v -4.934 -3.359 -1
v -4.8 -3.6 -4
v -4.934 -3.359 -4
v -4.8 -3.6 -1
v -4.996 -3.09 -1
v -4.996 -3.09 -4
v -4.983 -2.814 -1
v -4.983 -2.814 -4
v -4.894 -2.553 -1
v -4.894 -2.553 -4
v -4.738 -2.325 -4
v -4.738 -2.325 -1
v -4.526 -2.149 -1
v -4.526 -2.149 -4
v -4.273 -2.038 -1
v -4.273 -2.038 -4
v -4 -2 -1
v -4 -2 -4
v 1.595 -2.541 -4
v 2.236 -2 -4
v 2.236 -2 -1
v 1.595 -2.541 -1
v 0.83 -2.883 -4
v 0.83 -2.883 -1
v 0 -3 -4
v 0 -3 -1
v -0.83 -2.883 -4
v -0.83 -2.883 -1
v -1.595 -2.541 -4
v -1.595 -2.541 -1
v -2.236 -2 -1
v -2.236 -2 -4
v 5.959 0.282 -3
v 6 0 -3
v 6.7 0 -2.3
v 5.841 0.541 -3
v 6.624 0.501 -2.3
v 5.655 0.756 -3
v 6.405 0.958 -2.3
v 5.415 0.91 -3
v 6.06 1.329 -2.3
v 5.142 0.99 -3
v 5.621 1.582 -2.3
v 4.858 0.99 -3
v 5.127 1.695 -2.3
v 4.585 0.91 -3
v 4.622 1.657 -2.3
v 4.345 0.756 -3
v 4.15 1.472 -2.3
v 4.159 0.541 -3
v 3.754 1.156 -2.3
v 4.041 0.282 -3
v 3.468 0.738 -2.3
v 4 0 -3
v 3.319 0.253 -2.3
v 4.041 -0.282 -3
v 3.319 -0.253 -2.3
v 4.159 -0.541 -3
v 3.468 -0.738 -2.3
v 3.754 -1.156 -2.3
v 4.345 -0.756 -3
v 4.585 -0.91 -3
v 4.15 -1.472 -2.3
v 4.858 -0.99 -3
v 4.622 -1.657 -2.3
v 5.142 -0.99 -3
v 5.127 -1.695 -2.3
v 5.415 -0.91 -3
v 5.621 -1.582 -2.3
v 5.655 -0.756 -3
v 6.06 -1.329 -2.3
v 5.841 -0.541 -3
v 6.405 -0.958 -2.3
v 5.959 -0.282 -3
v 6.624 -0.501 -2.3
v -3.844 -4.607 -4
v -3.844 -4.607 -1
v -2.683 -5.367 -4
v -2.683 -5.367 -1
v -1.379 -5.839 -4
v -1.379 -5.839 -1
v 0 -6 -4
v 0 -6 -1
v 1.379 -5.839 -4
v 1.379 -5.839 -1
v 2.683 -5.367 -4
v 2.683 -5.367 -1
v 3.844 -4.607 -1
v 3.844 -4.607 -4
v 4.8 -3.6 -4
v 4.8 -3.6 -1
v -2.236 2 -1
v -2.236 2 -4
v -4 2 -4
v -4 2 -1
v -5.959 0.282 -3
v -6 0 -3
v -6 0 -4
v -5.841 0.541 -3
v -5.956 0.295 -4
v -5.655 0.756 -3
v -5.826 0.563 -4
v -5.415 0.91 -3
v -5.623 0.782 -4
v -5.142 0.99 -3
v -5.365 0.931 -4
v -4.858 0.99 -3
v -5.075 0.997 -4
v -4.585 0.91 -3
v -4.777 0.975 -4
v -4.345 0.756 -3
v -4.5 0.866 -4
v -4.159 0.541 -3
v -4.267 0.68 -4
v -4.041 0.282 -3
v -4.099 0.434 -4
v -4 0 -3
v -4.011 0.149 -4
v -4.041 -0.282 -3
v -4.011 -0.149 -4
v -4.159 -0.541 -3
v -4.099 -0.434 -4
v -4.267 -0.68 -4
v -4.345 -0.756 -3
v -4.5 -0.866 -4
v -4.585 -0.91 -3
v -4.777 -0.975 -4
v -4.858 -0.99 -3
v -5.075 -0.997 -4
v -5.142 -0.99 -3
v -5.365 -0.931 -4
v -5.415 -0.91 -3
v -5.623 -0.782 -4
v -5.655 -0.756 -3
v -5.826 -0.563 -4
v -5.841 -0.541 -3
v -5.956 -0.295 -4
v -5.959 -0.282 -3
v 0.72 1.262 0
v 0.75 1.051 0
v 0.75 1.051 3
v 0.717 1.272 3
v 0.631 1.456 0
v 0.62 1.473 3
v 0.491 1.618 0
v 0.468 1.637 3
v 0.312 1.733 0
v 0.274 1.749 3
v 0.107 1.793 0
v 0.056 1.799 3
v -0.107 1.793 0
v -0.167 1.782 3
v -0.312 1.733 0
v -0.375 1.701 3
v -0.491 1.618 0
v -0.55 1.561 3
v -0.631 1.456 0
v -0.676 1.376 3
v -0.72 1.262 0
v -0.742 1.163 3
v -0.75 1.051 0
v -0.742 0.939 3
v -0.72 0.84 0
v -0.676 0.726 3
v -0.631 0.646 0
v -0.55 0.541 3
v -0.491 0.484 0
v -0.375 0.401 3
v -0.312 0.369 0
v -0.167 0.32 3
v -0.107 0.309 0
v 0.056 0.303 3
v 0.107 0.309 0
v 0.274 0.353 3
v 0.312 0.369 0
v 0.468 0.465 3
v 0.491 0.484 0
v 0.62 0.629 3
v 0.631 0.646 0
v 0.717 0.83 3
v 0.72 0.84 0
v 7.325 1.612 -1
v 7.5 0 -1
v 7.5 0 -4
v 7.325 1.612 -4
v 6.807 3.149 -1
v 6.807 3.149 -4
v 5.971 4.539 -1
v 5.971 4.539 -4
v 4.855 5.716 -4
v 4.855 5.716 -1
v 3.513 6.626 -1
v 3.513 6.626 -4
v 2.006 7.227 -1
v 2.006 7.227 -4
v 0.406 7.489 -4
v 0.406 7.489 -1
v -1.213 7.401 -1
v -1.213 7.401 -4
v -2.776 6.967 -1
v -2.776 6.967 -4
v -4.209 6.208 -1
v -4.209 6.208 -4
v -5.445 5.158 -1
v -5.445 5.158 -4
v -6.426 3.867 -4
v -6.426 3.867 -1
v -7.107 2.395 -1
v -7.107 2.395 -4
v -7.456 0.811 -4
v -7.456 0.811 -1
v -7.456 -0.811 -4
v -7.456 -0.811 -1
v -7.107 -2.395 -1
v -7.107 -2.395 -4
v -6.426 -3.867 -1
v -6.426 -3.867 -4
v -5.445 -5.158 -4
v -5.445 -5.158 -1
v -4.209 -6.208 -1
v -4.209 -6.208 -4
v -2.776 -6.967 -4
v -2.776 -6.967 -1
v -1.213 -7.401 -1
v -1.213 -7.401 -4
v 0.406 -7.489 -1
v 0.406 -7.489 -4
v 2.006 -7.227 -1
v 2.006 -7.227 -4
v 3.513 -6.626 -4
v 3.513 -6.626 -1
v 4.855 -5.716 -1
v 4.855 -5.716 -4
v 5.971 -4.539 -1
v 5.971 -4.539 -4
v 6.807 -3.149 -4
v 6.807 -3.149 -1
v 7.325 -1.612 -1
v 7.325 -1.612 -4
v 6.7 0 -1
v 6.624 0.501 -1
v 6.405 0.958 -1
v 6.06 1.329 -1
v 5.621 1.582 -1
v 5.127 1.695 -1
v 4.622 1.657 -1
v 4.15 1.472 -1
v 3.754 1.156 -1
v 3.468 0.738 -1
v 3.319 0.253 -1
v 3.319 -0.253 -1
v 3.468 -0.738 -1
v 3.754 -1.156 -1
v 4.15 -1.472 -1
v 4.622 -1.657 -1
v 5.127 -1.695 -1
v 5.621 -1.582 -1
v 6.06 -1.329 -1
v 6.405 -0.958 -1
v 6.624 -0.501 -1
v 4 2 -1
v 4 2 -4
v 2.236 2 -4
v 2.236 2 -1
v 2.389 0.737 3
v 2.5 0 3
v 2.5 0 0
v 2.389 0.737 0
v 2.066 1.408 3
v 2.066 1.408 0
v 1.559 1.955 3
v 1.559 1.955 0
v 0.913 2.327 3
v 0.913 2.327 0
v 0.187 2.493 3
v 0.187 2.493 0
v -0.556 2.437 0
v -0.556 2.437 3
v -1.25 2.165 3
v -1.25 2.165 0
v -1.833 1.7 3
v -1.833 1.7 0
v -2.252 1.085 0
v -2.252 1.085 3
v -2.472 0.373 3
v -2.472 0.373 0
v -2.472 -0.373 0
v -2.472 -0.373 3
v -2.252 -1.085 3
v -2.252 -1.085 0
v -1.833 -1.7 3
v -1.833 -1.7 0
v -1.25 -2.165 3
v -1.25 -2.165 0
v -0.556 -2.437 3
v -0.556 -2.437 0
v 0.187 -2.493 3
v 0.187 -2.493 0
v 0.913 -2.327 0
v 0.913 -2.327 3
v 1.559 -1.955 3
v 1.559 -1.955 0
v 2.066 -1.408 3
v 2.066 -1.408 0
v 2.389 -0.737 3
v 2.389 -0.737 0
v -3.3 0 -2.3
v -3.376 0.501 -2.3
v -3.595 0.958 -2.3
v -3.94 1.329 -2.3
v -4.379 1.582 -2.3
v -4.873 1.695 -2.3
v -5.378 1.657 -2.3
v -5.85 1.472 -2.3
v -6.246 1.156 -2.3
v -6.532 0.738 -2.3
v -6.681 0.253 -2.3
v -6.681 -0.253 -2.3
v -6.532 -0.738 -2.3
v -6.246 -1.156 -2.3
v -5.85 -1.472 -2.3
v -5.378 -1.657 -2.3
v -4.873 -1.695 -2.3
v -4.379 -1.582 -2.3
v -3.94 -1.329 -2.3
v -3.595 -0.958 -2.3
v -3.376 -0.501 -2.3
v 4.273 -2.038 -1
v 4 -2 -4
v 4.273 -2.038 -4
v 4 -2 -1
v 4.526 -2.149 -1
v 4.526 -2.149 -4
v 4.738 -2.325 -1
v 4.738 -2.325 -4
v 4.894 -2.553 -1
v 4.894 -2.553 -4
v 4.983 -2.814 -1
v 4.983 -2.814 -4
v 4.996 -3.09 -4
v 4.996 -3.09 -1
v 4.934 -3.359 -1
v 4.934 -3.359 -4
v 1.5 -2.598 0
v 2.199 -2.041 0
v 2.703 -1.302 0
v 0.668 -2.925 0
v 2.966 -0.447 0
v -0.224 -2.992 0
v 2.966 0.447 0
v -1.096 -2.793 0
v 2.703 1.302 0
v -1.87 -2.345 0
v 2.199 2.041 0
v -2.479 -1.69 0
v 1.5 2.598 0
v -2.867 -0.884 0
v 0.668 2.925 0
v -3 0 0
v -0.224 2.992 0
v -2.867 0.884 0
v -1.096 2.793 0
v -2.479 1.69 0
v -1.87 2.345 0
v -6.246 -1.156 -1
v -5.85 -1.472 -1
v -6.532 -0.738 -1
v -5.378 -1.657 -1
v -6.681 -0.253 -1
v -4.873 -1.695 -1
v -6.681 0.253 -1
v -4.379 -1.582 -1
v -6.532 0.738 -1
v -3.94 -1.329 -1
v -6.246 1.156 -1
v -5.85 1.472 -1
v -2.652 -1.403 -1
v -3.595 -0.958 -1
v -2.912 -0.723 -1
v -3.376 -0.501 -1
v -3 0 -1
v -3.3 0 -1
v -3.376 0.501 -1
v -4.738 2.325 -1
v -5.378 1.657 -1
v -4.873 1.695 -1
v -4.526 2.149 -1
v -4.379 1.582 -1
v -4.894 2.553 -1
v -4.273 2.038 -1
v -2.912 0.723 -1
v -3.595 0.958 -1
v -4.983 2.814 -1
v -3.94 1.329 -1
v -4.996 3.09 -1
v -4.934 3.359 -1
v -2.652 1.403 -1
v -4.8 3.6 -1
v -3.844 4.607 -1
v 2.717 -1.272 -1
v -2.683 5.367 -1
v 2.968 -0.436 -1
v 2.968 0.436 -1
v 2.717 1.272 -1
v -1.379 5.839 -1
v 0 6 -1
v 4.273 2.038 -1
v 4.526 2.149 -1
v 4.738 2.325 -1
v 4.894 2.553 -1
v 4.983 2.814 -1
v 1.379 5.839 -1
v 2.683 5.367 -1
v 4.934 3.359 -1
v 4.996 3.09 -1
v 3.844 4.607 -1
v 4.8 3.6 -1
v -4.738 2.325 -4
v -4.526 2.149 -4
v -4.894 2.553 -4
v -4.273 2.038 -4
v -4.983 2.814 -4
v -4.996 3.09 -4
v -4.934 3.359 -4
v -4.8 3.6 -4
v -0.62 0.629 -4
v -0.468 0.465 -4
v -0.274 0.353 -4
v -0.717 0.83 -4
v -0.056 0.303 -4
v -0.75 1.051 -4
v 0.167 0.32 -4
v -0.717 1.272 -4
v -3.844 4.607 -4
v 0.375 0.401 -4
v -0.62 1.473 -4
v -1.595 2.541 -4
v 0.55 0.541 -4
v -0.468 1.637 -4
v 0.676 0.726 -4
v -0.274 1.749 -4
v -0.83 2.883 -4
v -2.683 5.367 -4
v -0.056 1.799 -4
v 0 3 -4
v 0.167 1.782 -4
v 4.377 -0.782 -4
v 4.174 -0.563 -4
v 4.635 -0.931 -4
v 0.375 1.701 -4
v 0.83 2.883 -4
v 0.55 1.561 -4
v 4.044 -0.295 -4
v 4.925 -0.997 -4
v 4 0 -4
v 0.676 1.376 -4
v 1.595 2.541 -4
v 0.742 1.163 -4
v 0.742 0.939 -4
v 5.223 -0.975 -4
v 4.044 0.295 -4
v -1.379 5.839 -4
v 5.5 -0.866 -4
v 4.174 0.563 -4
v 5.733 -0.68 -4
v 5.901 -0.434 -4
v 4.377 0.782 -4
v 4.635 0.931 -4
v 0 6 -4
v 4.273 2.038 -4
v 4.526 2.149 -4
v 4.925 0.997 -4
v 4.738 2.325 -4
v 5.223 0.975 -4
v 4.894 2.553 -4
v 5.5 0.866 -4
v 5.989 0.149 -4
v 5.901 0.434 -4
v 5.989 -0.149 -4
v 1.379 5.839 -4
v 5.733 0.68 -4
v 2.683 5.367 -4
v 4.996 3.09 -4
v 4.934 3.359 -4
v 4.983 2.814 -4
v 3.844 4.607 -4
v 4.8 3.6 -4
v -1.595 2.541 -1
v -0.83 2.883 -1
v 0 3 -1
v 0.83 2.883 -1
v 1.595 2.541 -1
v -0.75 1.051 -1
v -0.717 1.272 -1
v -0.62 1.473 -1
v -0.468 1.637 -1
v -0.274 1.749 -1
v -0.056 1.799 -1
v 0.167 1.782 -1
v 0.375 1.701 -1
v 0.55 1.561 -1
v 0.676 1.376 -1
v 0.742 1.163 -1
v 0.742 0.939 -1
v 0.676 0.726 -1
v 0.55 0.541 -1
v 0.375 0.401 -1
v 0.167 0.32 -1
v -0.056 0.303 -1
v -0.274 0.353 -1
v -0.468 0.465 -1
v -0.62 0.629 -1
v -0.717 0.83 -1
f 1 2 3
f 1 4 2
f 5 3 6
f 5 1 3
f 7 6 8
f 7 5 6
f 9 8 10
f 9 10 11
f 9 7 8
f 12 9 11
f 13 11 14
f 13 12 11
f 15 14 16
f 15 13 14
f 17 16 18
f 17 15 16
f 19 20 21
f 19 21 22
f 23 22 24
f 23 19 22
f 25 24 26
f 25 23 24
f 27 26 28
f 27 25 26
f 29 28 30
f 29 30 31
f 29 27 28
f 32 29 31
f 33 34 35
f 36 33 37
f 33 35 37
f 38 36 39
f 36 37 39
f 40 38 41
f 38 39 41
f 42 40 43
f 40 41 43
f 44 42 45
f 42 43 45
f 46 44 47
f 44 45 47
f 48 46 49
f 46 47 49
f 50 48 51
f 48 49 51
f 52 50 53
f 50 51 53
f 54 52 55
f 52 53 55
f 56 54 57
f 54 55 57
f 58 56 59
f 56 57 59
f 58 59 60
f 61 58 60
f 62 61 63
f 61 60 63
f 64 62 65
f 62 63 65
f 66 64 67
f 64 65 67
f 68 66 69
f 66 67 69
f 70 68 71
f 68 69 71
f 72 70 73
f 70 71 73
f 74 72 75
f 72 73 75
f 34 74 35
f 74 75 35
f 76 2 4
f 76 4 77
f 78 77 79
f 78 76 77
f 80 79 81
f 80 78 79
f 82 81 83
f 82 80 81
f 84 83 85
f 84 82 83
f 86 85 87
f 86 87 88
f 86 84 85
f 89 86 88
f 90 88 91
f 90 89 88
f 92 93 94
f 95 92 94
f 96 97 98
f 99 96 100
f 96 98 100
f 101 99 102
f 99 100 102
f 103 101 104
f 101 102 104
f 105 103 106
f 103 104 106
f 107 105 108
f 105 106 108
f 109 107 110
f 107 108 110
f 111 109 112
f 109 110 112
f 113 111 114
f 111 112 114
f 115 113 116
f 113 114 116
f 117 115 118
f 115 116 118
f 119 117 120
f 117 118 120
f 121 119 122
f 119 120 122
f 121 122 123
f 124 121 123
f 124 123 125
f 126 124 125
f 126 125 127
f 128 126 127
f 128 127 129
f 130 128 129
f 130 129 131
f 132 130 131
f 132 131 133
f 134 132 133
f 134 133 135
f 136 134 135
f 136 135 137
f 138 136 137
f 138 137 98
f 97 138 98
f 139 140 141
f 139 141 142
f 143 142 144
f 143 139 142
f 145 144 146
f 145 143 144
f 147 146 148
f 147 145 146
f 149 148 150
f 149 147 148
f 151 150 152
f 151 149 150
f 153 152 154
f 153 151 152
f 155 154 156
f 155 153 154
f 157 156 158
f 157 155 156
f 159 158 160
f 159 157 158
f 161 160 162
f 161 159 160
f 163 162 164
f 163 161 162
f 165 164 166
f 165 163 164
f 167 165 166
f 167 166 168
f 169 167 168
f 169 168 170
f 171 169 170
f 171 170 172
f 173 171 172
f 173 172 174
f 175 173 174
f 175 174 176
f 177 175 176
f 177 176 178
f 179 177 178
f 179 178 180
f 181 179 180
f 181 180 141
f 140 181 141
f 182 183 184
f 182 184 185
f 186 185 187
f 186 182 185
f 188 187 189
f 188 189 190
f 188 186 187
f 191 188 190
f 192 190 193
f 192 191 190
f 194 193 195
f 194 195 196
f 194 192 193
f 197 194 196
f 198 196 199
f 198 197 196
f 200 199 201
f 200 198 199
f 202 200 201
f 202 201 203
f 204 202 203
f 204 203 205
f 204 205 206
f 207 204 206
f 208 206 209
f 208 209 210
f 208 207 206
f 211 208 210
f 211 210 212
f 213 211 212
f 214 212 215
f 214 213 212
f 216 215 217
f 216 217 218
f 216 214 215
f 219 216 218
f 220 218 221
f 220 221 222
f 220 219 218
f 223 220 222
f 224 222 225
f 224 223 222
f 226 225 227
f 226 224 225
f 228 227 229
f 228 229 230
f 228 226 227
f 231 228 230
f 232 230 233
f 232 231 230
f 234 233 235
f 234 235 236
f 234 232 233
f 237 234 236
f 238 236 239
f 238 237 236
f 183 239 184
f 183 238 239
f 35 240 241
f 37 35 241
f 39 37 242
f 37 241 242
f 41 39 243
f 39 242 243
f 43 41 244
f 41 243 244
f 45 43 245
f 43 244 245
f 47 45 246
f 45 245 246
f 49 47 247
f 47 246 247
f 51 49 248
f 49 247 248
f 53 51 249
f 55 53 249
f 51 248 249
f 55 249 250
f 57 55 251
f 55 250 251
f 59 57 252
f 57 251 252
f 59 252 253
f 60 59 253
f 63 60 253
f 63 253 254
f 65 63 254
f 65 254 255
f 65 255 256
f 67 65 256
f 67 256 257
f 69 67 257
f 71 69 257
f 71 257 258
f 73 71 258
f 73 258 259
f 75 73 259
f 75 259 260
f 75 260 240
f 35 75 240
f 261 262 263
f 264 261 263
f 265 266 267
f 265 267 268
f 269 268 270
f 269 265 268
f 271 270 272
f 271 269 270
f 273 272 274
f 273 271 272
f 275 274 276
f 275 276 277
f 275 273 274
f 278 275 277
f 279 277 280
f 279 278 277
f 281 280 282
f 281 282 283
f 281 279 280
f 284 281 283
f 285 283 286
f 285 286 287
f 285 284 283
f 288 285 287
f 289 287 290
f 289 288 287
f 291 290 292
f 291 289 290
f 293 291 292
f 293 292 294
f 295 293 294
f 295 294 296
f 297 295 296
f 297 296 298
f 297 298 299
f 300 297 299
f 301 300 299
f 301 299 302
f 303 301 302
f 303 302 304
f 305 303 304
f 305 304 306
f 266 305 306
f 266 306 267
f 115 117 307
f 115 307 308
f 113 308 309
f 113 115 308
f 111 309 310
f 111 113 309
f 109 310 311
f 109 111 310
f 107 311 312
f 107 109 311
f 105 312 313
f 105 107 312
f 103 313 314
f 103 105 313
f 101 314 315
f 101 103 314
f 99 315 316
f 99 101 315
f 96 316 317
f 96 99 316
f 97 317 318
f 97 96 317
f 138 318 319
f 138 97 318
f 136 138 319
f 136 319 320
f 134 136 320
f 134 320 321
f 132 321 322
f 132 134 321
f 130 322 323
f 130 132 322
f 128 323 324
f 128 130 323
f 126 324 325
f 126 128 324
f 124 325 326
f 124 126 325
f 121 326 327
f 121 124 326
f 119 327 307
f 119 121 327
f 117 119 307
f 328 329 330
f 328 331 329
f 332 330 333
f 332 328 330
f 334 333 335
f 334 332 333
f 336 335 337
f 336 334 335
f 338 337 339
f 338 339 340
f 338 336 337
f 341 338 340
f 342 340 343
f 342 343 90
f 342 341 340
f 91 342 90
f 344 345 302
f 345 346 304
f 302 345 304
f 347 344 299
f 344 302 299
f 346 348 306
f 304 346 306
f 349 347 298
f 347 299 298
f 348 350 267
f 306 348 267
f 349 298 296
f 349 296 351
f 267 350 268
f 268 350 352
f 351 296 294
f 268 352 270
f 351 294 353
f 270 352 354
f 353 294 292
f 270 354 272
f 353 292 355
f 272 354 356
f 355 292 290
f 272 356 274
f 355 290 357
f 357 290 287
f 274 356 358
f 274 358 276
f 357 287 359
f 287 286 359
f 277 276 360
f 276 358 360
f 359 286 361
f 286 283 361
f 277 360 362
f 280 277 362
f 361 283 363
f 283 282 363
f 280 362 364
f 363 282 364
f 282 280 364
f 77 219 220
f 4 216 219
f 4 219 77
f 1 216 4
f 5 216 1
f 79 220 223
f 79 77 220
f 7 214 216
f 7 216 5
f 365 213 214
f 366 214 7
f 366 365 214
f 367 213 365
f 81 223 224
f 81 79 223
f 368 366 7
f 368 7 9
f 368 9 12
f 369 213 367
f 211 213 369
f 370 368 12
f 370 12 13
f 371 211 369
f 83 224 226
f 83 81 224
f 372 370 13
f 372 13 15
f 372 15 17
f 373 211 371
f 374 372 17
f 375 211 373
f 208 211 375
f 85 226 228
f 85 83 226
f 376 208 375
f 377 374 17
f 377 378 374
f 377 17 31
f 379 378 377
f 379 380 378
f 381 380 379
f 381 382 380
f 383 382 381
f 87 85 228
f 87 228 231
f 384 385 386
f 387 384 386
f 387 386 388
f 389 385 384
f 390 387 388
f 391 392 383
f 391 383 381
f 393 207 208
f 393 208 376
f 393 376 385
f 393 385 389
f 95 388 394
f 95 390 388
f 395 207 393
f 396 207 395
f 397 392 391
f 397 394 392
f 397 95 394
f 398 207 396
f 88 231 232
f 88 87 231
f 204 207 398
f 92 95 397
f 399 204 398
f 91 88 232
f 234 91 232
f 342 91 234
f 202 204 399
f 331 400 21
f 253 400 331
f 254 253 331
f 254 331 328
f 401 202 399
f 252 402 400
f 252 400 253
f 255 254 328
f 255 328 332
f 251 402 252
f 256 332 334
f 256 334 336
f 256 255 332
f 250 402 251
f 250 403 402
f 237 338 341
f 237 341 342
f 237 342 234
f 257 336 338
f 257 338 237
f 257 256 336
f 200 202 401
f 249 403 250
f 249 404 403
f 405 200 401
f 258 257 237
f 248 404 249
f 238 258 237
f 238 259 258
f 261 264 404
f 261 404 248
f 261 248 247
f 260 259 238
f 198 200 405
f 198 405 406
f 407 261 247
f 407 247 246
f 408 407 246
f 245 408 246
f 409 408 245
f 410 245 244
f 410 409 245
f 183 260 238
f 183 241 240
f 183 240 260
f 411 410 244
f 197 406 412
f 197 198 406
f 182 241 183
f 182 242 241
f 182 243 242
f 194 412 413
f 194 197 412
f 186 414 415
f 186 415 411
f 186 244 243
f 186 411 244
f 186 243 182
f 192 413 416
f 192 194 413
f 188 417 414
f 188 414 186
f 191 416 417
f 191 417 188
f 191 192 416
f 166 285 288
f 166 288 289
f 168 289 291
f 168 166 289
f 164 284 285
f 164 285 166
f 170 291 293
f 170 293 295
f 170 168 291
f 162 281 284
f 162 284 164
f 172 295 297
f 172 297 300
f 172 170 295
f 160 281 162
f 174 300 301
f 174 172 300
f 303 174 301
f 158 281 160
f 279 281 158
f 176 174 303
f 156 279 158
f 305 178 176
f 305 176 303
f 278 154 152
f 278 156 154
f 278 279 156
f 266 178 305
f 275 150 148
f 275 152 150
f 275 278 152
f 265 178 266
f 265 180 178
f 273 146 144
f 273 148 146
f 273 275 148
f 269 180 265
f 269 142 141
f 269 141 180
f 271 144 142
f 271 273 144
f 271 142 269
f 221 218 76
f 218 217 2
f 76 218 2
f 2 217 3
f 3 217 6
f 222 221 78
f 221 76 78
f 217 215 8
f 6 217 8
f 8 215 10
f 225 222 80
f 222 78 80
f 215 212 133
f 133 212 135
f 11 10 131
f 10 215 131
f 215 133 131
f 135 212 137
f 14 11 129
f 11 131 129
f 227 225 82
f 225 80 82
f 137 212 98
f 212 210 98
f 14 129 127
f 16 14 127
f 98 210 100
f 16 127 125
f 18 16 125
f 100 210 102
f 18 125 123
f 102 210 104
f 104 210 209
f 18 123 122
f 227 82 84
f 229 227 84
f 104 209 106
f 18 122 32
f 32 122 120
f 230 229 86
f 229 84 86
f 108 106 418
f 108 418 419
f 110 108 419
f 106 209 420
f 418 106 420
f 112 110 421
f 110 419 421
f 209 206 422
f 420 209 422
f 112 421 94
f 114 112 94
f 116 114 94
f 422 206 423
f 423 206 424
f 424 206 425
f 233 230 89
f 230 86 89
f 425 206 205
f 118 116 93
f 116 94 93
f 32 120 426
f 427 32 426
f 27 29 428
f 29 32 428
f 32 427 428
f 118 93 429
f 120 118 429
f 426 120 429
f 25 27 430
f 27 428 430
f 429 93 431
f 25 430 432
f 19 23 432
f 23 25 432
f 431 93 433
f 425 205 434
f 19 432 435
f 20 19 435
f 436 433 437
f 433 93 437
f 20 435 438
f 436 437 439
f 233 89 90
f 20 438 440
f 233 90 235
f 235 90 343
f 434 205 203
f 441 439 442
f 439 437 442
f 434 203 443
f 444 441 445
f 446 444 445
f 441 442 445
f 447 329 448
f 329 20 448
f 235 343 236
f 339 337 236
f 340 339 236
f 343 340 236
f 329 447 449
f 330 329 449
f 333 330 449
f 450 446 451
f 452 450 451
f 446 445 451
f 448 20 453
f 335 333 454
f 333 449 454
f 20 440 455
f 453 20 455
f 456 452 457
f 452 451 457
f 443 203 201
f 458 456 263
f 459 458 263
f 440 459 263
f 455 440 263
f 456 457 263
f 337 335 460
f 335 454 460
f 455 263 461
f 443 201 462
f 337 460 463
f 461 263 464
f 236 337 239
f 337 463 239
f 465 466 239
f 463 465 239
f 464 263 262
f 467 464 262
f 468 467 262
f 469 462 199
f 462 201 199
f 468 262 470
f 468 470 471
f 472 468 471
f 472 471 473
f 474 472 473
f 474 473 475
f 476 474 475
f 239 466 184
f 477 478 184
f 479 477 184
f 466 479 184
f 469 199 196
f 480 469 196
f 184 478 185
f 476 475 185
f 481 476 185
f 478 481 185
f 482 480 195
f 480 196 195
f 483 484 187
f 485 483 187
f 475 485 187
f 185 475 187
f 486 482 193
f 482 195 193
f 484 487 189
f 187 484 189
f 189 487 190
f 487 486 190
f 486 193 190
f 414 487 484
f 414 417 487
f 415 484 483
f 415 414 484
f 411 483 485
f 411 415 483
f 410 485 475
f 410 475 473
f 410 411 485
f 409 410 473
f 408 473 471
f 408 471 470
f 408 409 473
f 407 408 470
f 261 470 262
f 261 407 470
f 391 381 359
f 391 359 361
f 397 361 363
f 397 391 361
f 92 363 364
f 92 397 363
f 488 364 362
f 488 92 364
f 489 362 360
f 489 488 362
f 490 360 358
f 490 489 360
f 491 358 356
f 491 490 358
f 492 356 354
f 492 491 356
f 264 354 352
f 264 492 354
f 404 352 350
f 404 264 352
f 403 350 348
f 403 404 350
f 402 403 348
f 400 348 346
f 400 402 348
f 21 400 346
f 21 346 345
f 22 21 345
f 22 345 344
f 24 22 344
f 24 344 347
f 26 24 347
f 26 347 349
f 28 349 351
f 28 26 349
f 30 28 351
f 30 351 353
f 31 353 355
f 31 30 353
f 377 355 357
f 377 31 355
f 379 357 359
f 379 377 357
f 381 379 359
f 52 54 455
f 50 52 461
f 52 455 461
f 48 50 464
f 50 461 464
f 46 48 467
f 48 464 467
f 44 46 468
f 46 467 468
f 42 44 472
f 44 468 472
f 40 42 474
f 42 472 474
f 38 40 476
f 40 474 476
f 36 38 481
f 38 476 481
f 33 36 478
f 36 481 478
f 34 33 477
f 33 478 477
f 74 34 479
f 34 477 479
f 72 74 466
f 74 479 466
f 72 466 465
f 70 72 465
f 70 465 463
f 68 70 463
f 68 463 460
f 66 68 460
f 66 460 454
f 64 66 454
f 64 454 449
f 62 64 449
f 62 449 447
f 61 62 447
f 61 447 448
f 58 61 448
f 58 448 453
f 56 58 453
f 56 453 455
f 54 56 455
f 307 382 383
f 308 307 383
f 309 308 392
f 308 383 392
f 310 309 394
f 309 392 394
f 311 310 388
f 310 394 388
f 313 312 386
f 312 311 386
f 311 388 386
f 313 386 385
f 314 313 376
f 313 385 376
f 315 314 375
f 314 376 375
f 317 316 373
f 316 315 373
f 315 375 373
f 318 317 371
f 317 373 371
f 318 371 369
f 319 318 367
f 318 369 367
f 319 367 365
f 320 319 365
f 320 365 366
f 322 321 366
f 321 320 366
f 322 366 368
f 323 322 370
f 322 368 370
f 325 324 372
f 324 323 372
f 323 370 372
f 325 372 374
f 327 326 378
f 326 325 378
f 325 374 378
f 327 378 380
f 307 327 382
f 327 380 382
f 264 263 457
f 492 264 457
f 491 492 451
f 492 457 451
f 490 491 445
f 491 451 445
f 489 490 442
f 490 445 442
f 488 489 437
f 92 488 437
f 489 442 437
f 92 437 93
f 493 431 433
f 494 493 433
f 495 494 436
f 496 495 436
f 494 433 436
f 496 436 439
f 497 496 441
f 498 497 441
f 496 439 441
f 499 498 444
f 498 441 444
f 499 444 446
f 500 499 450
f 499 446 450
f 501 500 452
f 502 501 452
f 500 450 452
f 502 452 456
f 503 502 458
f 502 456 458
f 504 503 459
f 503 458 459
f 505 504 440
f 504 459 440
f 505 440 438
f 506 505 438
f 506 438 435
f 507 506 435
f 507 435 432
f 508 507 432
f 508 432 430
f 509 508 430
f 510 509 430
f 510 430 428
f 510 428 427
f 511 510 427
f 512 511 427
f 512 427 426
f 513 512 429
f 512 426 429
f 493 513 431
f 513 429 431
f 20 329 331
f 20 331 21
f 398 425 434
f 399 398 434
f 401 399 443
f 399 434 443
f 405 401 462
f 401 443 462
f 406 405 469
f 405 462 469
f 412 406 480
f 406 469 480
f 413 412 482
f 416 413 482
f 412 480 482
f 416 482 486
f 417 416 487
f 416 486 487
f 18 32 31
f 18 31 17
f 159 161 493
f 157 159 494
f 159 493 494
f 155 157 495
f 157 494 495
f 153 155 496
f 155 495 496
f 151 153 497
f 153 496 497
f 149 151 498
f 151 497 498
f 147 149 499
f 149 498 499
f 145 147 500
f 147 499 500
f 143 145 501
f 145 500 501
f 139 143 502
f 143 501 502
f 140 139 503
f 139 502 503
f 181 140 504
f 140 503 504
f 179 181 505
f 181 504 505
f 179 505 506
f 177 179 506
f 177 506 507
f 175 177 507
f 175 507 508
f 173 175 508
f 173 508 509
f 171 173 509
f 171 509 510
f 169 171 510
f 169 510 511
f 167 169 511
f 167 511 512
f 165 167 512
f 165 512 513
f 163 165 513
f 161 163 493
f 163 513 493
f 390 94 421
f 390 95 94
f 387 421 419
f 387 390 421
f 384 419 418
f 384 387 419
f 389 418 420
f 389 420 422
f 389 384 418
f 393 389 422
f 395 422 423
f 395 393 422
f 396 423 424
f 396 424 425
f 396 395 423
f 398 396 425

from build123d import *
from build123d.topology import SkipClean

# Parameters (mm, degrees)
SKETCH_1_R          = 5
SKETCH_1_R_2        = 0.75
EXTRUDE_1_DEPTH     = 3
SKETCH_3_R          = 6.372954201
SKETCH_3_R_2        = 2.5
CUT_EXTRUDE_1_DEPTH = 10
EXTRUDE_START       = 1
SKETCH_5_R          = 3
SKETCH_5_R_2        = 0.75
EXTRUDE_3_DEPTH     = 1
EXTRUDE_START_2     = 3
SKETCH_6_R          = 7
SKETCH_6_R_2        = 1
SKETCH_6_R_3        = 0.75
EXTRUDE_4_DEPTH     = 3
FILLET_2_R          = 1
SKETCH_7_R          = 1.5
CUT_EXTRUDE_2_DEPTH = 2
CHAMFER_1_SIZE      = 0.5
SKETCH_8_R          = 1.7
CUT_EXTRUDE_3_DEPTH = 2
CHAMFER_2_SIZE      = 0.7
SKETCH_9_R          = 7.5
SKETCH_9_R_2        = 6.7
EXTRUDE_5_DEPTH     = 3


# Some blends are built 0.0001 mm under size
with BuildPart() as part:
    # 草图1 → 凸台-拉伸1 (new body)
    with BuildSketch(Plane.XY):
        Circle(SKETCH_1_R)
        with Locations((0, 1.051)):
            Circle(SKETCH_1_R_2, mode=Mode.SUBTRACT)
    extrude(amount=EXTRUDE_1_DEPTH)

    # 草图3 → 切除-拉伸1 (cut)
    with BuildSketch(Plane.XY.offset(3)):
        Circle(SKETCH_3_R)
        Circle(SKETCH_3_R_2, mode=Mode.SUBTRACT)
    extrude(amount=-CUT_EXTRUDE_1_DEPTH, mode=Mode.SUBTRACT)

    # 草图5 → 凸台-拉伸3 (add)
    with SkipClean():  # the faces are left unmerged after this step: merging them gives an invalid solid
        with BuildSketch(Plane(origin=(0, 0, 0), x_dir=(-1, 0, 0), z_dir=(0, 0, -1)).offset(EXTRUDE_START)):
            Circle(SKETCH_5_R)
            with Locations((0, 1.051)):
                Circle(SKETCH_5_R_2, mode=Mode.SUBTRACT)
        extrude(amount=-EXTRUDE_3_DEPTH)

    # 草图6 → 凸台-拉伸4 (add)
    with SkipClean():  # the faces are left unmerged after this step: merging them gives an invalid solid
        with BuildSketch(Plane(origin=(0, 0, -1), x_dir=(-1, 0, 0), z_dir=(0, 0, -1)).offset(EXTRUDE_START_2)):
            Circle(SKETCH_6_R)
            with Locations((-5, 0)):
                Circle(SKETCH_6_R_2, mode=Mode.SUBTRACT)
            with Locations((5, 0)):
                Circle(SKETCH_6_R_2, mode=Mode.SUBTRACT)
            with Locations((0, 1.051)):
                Circle(SKETCH_6_R_3, mode=Mode.SUBTRACT)
            with BuildLine():
                Line((2.236067977, 2), (5.656854249, 2))
                ThreePointArc((5.656854249, 2), (0, 6), (-5.656854249, 2))
                Line((-5.656854249, 2), (-2.236067977, 2))
                ThreePointArc((-2.236067977, 2), (0, 3), (2.236067977, 2))
            make_face(mode=Mode.SUBTRACT)
            with BuildLine():
                Line((2.236067977, -2), (5.656854249, -2))
                ThreePointArc((5.656854249, -2), (0, -6), (-5.656854249, -2))
                Line((-5.656854249, -2), (-2.236067977, -2))
                ThreePointArc((-2.236067977, -2), (0, -3), (2.236067977, -2))
            make_face(mode=Mode.SUBTRACT)
        extrude(amount=-EXTRUDE_4_DEPTH)

    # 圆角2
    fillet_2_edges = [part.edges().sort_by_distance(p)[0] for p in [
        (-5.656854249, -2, -2.5),
        (5.656854249, -2, -2.5),
        (-5.656854249, 2, -2.5),
        (5.656854249, 2, -2.5),
    ]]
    fillet(fillet_2_edges, radius=FILLET_2_R)

    # 草图7 → 切除-拉伸2 (cut)
    with BuildSketch(Plane.XY.offset(-1)):
        with Locations((-5, 0)):
            Circle(SKETCH_7_R)
        with Locations((5, 0)):
            Circle(SKETCH_7_R)
    extrude(amount=-CUT_EXTRUDE_2_DEPTH, mode=Mode.SUBTRACT)

    # 倒角1
    chamfer_1_edges = [part.edges().sort_by_distance(p)[0] for p in [
        (-6.5, 0, -3),
        (3.5, 0, -3),
    ]]
    chamfer(chamfer_1_edges, length=CHAMFER_1_SIZE - 0.0001)  # a hair under: the kernel refuses the full size

    # 草图8 → 切除-拉伸3 (cut)
    with BuildSketch(Plane.XY.offset(-1)):
        with Locations((-5, 0)):
            Circle(SKETCH_8_R)
        with Locations((5, 0)):
            Circle(SKETCH_8_R)
    extrude(amount=-CUT_EXTRUDE_3_DEPTH, mode=Mode.SUBTRACT)

    # 倒角2
    # the kernel refuses this chamfer: 0.7 mm, written as the material it adds along each edge
    with BuildSketch(Plane(origin=(-5, 0, -3), x_dir=(1, 0, 0), z_dir=(0, -1, 0))) as chamfer_2_piece_1_section:
        Polygon((1.7, CHAMFER_2_SIZE), (1.7 - CHAMFER_2_SIZE, 0), (1.7, 0), align=None)
    chamfer_2_piece_1 = revolve(axis=Axis((-5, 0, -3), (0, 0, 1)), mode=Mode.PRIVATE)
    chamfer_2_piece_1 = chamfer_2_piece_1 - Plane(origin=(-5, 0, -2.649679333), x_dir=(-1, 0, 0), z_dir=(0, 0, -1)) * Cylinder(1, 7, mode=Mode.PRIVATE)
    add(chamfer_2_piece_1)
    with BuildSketch(Plane(origin=(5, 0, -3), x_dir=(1, 0, 0), z_dir=(0, -1, 0))) as chamfer_2_piece_2_section:
        Polygon((1.7 - CHAMFER_2_SIZE, 0), (1.7, CHAMFER_2_SIZE), (1.7, 0), align=None)
    chamfer_2_piece_2 = revolve(axis=Axis((5, 0, -3), (0, 0, 1)), mode=Mode.PRIVATE)
    chamfer_2_piece_2 = chamfer_2_piece_2 - Plane(origin=(5, 0, -2.649679333), x_dir=(-1, 0, 0), z_dir=(0, 0, -1)) * Cylinder(1, 7, mode=Mode.PRIVATE)
    add(chamfer_2_piece_2)

    # 草图9 → 凸台-拉伸5 (add)
    with BuildSketch(Plane.XY.offset(-1)):
        Circle(SKETCH_9_R)
        Circle(SKETCH_9_R_2, mode=Mode.SUBTRACT)
    extrude(amount=-EXTRUDE_5_DEPTH)


solid = part.part
